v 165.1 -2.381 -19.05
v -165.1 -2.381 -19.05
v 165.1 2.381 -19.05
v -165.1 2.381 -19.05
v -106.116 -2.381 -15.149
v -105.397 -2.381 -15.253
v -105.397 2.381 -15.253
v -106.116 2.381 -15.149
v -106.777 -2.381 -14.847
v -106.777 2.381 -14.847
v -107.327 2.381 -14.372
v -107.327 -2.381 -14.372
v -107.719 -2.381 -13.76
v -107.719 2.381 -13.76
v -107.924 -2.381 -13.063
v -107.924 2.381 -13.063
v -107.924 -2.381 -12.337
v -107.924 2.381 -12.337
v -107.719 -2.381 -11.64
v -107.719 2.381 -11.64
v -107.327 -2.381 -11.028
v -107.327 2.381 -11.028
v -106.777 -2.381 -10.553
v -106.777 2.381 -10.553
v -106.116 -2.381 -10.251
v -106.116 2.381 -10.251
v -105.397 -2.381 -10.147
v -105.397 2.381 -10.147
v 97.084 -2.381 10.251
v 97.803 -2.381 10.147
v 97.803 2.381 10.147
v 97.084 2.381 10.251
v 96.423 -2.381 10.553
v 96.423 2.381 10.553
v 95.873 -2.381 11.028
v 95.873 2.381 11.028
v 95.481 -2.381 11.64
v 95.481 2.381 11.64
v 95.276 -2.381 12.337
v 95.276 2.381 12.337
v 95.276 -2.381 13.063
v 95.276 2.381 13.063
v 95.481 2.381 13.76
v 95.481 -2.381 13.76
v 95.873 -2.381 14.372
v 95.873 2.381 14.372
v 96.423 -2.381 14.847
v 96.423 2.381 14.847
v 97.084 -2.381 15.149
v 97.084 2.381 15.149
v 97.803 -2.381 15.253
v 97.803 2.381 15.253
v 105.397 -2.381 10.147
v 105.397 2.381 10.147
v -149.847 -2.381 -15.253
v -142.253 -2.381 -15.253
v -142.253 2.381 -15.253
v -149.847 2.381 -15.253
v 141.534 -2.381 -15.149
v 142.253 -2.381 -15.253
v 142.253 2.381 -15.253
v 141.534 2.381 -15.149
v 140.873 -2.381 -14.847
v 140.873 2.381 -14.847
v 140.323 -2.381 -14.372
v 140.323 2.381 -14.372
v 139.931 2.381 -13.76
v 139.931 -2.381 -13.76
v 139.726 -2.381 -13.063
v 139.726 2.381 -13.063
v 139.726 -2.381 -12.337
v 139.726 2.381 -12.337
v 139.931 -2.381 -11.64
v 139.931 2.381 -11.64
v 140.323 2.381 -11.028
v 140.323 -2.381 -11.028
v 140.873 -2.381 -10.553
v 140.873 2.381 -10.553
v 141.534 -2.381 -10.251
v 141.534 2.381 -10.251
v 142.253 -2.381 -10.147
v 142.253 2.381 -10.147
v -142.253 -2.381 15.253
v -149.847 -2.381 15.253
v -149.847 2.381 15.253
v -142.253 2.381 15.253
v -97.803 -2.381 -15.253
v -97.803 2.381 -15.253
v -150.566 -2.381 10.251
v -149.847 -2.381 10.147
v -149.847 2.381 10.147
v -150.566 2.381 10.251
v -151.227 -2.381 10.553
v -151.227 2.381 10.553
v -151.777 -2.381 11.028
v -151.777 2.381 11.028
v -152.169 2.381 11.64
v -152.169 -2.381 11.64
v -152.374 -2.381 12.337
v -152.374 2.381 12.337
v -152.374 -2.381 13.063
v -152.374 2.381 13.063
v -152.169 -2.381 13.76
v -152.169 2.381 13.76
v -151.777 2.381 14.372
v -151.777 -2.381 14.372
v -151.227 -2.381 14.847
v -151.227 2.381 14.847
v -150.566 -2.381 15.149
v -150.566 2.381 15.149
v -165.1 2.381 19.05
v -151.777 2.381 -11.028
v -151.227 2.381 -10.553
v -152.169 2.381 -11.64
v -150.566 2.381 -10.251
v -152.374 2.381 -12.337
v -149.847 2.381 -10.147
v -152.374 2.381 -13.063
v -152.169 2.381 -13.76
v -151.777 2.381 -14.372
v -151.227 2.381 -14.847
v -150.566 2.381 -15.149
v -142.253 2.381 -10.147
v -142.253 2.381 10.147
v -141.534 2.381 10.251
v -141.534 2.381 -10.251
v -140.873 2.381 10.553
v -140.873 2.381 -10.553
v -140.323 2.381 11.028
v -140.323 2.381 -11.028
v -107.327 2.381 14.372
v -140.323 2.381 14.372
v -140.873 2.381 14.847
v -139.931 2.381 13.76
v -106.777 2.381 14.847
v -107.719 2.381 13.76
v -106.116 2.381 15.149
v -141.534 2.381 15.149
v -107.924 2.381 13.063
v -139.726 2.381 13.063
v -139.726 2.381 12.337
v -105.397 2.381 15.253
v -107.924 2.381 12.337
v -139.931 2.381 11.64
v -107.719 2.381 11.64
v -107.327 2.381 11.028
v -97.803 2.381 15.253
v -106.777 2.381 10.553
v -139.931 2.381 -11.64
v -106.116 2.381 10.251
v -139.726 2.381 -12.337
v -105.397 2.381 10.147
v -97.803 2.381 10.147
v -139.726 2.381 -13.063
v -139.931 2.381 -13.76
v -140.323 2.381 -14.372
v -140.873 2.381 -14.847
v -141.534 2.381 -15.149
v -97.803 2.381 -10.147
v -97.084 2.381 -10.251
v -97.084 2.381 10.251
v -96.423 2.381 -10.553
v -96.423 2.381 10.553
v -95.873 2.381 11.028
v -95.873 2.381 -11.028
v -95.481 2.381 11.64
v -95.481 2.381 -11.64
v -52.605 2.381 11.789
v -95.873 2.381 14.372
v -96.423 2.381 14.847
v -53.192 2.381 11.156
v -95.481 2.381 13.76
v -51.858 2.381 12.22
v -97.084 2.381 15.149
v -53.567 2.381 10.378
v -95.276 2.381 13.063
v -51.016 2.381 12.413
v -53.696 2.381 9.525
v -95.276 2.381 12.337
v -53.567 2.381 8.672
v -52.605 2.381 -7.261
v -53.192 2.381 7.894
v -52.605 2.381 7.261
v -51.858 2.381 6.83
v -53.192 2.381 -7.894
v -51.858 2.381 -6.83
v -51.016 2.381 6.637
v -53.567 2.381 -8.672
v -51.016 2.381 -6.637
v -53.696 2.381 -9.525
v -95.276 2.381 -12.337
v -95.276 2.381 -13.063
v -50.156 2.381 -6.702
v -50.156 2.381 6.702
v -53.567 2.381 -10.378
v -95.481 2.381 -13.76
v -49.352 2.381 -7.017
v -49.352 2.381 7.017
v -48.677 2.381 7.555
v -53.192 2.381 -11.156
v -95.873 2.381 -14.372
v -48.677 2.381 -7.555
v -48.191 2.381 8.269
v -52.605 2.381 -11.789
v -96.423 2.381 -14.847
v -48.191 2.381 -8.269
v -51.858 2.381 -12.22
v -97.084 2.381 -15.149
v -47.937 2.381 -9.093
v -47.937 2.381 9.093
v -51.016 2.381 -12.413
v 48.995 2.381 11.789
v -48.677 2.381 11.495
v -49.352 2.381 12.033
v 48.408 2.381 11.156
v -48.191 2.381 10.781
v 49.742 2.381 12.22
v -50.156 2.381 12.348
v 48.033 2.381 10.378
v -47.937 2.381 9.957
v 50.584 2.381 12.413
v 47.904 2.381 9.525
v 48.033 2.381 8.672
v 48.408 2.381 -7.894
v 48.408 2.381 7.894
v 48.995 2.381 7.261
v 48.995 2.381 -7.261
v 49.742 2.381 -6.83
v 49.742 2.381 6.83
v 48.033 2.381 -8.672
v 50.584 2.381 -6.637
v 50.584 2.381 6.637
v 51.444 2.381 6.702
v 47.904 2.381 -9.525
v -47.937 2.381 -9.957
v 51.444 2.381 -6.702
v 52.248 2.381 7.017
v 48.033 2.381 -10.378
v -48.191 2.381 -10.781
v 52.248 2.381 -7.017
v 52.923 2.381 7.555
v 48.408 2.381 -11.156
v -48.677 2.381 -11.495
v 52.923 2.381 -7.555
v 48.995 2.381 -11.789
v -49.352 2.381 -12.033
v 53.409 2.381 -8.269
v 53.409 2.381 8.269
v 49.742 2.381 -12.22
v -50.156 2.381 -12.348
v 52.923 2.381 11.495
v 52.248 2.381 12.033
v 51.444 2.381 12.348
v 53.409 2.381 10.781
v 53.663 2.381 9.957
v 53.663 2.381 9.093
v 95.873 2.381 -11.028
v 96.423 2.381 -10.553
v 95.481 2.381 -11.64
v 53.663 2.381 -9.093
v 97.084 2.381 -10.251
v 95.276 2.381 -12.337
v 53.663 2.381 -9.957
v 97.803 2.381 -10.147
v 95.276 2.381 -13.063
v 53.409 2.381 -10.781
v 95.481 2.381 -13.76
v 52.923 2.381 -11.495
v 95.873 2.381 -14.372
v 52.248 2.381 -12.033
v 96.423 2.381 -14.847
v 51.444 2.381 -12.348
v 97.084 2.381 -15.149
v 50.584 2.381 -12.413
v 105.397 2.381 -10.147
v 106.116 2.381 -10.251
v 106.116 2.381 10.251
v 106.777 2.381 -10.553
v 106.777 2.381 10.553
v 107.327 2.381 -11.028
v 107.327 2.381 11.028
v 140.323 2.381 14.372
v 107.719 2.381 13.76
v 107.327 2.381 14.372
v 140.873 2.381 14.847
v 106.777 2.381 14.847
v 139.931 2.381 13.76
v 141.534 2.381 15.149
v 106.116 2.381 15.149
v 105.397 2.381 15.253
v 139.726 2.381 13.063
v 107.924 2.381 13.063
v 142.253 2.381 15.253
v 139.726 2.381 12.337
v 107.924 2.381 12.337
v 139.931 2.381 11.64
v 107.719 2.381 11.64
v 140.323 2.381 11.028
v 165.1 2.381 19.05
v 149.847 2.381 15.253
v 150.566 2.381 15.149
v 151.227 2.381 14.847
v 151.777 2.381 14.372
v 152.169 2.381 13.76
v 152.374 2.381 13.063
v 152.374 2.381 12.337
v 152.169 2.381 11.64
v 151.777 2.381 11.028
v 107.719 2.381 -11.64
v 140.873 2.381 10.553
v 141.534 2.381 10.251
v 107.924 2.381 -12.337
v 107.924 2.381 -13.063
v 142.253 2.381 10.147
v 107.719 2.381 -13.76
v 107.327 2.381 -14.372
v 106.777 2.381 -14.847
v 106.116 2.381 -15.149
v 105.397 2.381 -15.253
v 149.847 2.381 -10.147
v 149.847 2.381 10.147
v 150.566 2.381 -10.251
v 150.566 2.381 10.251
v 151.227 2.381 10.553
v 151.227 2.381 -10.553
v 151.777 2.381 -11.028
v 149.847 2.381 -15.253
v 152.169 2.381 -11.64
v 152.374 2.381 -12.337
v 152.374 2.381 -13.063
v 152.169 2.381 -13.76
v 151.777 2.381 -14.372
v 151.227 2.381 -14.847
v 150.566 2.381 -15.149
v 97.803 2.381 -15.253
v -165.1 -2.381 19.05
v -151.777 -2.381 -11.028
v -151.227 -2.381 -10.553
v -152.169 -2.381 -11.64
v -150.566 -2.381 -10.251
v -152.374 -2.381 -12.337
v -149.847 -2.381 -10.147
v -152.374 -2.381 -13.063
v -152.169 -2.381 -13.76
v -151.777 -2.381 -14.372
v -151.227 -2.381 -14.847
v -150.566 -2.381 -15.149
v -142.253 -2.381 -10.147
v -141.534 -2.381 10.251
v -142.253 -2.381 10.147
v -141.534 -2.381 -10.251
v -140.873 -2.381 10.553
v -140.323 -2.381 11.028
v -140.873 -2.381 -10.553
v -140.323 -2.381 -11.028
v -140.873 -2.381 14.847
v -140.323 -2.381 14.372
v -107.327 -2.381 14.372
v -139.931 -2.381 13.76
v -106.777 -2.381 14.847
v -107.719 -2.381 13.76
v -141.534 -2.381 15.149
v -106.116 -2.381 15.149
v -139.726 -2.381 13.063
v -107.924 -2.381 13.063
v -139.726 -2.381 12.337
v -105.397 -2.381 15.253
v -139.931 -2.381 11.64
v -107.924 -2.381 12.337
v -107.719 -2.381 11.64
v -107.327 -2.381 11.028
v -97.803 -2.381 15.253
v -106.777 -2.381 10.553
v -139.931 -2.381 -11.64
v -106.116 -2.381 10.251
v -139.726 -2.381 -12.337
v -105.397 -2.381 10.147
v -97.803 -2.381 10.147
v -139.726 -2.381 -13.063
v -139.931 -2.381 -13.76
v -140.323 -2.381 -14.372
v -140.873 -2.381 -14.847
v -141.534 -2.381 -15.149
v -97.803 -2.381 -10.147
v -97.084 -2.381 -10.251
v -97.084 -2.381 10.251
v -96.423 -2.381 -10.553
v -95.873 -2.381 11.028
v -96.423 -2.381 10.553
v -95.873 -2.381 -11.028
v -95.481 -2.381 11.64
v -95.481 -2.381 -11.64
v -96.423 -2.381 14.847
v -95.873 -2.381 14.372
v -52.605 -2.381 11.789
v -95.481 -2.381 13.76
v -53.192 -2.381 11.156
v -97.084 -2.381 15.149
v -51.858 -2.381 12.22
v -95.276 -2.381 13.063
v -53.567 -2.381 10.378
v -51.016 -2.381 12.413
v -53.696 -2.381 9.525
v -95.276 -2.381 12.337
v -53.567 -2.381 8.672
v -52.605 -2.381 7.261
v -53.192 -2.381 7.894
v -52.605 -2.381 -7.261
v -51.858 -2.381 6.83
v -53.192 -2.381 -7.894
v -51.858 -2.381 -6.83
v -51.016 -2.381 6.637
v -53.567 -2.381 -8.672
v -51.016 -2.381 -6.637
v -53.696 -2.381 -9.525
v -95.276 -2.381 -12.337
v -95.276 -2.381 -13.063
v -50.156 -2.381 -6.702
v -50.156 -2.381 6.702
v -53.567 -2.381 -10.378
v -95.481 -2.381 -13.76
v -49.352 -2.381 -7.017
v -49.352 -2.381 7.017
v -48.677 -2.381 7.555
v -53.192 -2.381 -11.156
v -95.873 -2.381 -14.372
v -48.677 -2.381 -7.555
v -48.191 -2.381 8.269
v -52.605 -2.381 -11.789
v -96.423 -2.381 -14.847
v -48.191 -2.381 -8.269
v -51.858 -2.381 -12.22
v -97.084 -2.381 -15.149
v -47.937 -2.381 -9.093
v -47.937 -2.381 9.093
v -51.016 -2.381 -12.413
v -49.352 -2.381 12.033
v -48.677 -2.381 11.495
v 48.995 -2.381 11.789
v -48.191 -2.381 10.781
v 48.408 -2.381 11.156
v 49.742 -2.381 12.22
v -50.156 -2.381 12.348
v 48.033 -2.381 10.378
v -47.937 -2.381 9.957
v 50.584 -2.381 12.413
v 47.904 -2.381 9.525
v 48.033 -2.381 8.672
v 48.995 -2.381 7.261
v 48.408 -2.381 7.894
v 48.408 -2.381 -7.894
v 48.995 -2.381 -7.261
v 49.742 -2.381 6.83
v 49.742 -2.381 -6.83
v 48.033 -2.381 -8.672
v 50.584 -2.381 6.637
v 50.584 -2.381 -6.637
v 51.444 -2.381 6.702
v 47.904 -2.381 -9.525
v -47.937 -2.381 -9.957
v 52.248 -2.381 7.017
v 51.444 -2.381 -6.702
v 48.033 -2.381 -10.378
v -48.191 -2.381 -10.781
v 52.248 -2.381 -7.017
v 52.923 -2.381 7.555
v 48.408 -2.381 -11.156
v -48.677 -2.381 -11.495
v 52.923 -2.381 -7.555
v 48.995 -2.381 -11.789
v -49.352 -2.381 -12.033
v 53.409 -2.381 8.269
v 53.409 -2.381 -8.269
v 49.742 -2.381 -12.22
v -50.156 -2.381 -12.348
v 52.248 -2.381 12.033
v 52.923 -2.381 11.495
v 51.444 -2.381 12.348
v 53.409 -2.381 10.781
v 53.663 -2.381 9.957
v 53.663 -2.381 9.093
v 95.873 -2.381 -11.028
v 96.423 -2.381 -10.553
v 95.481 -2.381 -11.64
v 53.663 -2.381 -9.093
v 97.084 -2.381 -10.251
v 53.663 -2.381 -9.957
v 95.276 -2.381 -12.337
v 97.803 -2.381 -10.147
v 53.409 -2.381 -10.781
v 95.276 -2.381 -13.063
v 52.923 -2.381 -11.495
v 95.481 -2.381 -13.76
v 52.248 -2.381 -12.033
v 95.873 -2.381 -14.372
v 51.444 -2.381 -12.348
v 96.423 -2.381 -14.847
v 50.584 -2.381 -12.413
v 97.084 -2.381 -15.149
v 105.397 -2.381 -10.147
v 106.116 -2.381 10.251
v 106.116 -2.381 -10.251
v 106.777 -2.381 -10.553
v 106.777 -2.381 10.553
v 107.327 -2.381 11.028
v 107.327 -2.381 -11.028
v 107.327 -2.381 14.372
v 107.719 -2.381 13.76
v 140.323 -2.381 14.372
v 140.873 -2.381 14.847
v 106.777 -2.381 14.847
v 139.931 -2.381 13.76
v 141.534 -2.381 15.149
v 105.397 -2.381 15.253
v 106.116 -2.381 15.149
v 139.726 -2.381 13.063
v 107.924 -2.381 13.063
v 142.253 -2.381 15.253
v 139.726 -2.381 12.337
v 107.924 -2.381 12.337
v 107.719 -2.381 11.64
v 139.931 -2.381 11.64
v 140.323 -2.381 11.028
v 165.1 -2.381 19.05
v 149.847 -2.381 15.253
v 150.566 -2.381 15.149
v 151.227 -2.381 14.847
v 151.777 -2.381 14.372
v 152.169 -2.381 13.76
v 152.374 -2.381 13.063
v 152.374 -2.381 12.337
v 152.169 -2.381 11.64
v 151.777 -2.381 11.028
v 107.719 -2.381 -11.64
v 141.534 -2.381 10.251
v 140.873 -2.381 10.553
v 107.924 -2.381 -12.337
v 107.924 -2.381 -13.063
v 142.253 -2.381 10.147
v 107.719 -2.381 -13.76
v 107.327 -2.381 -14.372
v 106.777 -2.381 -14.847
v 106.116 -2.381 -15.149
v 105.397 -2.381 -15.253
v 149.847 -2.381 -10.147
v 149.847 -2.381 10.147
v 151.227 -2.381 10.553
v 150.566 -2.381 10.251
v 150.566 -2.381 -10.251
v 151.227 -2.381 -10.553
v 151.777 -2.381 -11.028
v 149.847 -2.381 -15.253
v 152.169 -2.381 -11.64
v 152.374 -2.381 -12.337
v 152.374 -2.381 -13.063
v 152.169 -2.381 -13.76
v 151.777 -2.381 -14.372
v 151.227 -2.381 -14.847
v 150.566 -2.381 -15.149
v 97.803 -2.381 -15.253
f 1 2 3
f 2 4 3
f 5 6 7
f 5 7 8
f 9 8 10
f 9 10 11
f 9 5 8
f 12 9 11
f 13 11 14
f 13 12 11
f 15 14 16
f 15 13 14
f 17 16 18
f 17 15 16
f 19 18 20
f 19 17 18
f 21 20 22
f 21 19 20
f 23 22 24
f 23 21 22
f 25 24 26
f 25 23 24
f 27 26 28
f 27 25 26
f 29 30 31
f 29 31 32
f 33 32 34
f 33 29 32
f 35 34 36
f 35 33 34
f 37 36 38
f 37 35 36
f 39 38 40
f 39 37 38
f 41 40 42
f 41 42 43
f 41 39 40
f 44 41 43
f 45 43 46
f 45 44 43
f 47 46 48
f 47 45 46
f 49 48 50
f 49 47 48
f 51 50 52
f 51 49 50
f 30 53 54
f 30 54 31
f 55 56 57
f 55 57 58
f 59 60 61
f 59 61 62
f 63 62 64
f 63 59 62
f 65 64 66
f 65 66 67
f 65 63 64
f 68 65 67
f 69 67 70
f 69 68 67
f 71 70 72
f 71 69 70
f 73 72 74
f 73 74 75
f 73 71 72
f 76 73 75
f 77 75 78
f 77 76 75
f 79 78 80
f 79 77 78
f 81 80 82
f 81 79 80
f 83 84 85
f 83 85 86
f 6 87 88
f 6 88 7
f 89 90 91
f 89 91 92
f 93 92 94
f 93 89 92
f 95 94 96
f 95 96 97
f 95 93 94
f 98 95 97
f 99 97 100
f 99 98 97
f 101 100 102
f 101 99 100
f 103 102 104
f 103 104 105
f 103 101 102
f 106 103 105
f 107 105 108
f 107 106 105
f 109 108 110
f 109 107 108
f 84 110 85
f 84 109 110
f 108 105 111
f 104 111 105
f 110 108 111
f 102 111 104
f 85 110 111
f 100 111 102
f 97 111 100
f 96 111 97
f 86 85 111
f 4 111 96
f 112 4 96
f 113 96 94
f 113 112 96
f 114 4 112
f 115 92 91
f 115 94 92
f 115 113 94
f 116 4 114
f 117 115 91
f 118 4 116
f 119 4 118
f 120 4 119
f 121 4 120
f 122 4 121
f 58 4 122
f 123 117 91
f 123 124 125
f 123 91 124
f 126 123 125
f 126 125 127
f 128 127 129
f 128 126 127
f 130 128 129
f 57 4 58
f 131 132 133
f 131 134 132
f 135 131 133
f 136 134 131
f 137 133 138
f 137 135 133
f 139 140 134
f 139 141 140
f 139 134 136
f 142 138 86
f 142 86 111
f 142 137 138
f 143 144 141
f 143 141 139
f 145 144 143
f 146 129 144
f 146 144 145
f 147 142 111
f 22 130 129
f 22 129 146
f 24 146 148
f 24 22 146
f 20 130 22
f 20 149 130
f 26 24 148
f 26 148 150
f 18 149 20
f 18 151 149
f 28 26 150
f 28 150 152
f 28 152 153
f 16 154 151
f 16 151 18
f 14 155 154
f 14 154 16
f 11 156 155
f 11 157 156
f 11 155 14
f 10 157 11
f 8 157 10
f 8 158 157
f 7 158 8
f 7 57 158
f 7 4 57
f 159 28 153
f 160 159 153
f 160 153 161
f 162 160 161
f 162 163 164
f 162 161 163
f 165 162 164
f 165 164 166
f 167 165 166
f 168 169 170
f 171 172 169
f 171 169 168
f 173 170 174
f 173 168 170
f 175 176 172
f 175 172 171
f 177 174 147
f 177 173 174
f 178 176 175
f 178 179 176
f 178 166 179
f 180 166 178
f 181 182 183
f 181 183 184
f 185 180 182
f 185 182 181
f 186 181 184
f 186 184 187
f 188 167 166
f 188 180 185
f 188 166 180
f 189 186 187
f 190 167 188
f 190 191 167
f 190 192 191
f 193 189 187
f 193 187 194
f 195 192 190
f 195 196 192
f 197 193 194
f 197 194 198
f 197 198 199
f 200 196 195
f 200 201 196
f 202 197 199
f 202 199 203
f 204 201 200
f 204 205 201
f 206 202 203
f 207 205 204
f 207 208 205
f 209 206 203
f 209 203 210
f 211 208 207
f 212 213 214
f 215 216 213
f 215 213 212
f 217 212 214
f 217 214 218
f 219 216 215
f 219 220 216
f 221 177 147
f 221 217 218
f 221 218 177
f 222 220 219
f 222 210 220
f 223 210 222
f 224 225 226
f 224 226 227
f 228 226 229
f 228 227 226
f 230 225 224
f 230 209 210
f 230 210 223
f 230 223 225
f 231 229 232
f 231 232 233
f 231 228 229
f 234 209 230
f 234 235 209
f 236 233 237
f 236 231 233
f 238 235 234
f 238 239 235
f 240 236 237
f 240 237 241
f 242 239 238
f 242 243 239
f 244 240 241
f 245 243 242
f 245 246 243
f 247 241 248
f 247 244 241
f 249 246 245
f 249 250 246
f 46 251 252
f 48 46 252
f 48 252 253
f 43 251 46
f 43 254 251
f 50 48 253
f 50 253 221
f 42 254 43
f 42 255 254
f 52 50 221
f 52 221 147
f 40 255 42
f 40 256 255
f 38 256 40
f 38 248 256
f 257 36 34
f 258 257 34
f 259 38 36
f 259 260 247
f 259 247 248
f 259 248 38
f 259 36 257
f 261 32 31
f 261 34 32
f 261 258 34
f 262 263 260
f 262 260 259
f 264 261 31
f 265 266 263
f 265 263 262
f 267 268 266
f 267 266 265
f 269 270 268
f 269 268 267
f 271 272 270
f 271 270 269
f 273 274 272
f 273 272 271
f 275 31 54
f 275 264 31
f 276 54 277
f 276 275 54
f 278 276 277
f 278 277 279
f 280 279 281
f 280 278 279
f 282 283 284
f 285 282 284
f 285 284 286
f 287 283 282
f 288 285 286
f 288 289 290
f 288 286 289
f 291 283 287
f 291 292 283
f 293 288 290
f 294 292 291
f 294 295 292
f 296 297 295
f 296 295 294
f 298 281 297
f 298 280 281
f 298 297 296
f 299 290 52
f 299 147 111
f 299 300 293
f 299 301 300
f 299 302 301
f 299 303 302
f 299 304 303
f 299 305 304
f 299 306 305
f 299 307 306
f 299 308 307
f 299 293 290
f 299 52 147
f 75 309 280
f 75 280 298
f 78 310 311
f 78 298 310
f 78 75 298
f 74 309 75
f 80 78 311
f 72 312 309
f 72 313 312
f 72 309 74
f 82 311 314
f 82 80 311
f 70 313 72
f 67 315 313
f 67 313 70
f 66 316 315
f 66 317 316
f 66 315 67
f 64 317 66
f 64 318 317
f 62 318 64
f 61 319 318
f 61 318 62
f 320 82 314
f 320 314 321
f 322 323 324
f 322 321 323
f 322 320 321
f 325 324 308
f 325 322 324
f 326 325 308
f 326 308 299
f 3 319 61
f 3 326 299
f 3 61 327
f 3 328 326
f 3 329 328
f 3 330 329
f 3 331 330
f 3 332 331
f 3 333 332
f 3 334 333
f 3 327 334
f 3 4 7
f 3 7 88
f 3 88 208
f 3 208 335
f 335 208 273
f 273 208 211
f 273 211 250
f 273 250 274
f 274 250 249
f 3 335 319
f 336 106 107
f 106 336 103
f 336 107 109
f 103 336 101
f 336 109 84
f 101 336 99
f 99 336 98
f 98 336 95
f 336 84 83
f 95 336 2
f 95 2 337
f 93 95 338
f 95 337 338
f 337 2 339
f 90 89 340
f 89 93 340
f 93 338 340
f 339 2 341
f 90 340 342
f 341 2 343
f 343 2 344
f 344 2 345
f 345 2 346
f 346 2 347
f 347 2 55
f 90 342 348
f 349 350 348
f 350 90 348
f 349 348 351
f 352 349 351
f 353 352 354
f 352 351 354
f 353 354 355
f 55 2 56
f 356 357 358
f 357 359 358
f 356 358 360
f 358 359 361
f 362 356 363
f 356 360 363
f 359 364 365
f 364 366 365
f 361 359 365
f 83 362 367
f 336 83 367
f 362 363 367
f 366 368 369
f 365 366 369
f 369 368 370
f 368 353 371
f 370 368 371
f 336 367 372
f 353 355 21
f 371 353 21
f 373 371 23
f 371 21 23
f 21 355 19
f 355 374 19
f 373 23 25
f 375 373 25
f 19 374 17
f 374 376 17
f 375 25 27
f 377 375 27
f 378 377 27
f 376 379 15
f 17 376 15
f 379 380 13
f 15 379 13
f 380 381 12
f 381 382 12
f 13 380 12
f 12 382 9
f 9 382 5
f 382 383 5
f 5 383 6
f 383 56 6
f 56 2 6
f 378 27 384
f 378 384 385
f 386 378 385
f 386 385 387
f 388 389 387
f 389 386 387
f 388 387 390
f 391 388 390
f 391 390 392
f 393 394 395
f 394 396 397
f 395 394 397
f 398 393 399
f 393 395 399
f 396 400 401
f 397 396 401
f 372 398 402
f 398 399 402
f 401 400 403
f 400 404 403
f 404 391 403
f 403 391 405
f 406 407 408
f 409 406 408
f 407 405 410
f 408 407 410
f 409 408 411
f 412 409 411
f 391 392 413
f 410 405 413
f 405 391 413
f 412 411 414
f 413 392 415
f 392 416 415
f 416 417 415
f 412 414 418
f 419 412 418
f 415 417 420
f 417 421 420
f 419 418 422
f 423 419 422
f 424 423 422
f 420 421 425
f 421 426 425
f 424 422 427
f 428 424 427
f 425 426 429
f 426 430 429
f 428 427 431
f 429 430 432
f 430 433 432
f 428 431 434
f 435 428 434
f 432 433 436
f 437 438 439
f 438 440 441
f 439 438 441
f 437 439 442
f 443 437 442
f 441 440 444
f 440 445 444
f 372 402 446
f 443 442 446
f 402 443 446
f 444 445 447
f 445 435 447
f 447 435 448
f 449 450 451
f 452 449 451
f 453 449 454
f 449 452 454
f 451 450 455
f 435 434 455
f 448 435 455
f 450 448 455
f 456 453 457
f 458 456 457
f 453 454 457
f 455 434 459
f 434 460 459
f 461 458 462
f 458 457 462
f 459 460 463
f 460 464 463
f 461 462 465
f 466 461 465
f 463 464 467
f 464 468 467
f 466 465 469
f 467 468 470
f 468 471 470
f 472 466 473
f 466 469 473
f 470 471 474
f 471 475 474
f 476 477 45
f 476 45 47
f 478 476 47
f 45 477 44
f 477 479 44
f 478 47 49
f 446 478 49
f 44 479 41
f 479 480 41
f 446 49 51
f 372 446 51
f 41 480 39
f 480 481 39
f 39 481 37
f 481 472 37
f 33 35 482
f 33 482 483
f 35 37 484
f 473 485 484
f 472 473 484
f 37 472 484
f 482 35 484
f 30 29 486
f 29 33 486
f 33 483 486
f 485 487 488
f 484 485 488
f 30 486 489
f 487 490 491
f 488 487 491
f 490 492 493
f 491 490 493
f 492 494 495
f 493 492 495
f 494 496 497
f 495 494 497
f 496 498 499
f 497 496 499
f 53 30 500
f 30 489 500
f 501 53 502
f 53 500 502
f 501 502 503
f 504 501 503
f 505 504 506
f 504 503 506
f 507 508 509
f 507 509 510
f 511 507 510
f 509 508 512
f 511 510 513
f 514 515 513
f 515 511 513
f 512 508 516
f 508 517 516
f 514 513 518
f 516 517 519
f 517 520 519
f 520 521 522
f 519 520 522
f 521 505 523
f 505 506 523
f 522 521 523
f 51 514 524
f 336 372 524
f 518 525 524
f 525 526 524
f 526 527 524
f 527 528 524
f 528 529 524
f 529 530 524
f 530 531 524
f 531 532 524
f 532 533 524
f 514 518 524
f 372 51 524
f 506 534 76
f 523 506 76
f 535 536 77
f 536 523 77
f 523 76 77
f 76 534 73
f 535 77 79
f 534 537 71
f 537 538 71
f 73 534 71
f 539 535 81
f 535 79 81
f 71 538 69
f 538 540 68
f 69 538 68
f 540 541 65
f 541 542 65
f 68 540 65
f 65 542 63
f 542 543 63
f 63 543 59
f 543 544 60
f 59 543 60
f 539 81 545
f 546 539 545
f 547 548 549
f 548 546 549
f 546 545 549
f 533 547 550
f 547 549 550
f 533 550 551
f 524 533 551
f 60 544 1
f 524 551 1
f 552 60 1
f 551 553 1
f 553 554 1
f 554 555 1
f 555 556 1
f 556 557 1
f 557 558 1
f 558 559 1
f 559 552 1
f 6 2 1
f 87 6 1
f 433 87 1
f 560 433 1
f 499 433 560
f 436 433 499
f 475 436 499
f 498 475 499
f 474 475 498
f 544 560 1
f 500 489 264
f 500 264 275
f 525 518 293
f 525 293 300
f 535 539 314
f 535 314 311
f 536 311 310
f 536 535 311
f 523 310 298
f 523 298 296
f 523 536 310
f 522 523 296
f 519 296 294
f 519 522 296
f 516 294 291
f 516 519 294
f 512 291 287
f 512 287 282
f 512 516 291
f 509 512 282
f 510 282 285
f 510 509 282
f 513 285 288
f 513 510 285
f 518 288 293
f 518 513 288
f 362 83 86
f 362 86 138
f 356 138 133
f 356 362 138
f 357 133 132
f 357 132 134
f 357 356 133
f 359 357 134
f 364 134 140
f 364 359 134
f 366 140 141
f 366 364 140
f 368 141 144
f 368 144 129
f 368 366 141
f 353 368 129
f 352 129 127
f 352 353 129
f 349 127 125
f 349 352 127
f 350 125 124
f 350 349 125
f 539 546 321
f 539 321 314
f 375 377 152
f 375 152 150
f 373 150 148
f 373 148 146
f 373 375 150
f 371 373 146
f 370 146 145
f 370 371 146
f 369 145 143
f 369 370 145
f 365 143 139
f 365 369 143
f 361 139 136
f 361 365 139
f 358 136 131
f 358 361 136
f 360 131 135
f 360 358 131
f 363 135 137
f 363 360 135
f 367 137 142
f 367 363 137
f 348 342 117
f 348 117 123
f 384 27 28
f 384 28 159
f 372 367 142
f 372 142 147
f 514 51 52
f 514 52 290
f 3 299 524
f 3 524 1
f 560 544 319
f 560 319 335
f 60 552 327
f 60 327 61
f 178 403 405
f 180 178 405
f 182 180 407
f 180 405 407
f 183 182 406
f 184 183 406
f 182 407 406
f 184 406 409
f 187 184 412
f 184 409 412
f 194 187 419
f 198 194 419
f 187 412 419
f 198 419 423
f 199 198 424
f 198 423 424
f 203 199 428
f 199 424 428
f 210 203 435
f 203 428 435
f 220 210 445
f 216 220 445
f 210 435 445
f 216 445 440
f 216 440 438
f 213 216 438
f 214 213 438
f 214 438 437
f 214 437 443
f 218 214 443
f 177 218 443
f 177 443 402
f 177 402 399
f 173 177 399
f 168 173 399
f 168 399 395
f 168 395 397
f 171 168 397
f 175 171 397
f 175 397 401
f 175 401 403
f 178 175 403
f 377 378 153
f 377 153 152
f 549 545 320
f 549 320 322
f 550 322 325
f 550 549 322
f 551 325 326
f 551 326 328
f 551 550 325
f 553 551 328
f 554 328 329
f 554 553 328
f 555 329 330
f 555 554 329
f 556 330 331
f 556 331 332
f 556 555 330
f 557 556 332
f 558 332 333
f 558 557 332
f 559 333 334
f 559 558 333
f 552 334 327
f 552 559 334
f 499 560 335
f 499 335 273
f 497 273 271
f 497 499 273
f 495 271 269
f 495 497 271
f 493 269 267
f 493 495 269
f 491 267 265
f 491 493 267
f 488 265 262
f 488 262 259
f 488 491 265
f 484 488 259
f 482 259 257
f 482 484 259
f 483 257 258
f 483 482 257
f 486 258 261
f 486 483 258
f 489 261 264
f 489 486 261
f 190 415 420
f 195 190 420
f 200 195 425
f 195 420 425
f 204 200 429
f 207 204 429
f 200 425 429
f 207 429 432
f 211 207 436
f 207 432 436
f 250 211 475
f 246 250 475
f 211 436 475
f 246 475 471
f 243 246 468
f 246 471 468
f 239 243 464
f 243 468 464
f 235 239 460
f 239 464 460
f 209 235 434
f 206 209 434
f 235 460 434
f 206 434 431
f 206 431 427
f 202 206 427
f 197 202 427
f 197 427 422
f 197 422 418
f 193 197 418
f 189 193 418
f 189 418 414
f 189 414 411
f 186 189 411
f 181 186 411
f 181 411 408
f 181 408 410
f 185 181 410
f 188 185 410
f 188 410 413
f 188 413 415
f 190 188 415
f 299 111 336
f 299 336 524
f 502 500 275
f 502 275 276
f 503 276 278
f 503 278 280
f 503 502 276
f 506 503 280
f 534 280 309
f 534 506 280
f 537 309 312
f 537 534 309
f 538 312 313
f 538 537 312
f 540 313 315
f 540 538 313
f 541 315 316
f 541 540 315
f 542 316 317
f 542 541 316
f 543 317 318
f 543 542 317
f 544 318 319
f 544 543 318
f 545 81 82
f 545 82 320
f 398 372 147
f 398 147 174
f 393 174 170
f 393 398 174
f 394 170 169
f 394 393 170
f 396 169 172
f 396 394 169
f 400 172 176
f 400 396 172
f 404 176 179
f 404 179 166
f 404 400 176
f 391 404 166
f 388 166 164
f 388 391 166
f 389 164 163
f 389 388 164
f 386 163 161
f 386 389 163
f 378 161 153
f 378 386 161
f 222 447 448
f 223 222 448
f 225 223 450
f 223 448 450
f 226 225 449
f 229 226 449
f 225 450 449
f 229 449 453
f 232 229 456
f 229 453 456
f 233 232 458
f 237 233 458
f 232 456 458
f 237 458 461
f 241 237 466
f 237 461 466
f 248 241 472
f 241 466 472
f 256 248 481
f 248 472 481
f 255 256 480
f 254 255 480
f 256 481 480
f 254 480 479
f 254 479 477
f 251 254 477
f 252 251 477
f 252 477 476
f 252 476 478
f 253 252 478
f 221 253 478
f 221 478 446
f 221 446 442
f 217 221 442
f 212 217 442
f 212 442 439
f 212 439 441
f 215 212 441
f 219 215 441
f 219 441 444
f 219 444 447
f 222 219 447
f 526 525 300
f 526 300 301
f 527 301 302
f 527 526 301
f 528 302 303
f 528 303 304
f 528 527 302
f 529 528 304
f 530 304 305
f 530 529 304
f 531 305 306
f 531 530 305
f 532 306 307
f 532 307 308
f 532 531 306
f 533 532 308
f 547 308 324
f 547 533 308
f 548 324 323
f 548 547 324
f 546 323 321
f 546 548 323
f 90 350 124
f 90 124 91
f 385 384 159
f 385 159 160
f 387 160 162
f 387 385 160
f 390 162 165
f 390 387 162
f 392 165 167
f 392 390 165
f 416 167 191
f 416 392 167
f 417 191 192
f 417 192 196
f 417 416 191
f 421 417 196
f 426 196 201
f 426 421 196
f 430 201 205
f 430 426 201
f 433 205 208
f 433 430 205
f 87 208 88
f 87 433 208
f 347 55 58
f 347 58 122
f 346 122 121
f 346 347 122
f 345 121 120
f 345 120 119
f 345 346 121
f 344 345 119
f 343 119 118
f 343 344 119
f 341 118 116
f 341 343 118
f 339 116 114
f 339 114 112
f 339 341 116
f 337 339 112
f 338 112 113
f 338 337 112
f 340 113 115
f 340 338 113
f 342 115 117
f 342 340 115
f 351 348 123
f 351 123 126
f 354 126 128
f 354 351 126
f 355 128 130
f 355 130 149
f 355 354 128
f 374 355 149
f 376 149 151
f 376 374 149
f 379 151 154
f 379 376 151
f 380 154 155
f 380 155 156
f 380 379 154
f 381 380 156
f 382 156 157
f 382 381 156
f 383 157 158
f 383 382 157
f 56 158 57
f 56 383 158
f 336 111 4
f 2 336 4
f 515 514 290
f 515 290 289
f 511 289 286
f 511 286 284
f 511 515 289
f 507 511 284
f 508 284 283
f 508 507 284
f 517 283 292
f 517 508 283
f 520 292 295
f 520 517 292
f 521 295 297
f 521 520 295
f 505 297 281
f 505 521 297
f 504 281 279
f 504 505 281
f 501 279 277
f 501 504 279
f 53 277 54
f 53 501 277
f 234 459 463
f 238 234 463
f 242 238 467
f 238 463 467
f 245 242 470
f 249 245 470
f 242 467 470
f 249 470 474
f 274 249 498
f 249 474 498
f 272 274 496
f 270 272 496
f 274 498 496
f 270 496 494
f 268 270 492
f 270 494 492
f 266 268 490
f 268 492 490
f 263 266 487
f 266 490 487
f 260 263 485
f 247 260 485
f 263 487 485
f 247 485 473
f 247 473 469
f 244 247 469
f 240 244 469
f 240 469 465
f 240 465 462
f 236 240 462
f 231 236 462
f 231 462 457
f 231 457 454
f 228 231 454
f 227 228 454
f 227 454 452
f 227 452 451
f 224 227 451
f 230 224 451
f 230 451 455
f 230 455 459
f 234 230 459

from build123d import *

# Parameters (mm, degrees)
SKETCH1_W                  = 330.2
SKETCH1_H                  = 38.1
BOSS_EXTRUDE1_DEPTH        = 2.38125
F_10_START                 = -2.38125
F_10_CLEARANCE_SLOT1_DEPTH = 4.7625
F_1_4_20_TAPPED_HOLE1_D    = 5.7912


# Read off the part's stored shape, not the designer's step: #10 Clearance Slot1
with BuildPart() as part:
    # Sketch1 → Boss-Extrude1 (new, symmetric)
    with BuildSketch(Plane(origin=(0, 0, 0), x_dir=(1, 0, 0), z_dir=(0, 1, 0))):
        Rectangle(SKETCH1_W, SKETCH1_H)
    extrude(amount=BOSS_EXTRUDE1_DEPTH, both=True)

    # #10 Clearance Slot1 outline → #10 Clearance Slot1 (cut)
    with BuildSketch(Plane(origin=(0, 0, 0), x_dir=(1, 0, 0), z_dir=(0, 1, 0)).offset(F_10_START)):
        with BuildLine():
            Line((142.2527, 10.1473), (149.8473, 10.1473))
            ThreePointArc((149.8473, 10.1473), (152.4, 12.7), (149.8473, 15.2527))
            Line((149.8473, 15.2527), (142.2527, 15.2527))
            ThreePointArc((142.2527, 15.2527), (139.7, 12.7), (142.2527, 10.1473))
        make_face()
        with BuildLine():
            ThreePointArc((105.3973, 10.1473), (107.95, 12.7), (105.3973, 15.2527))
            Line((105.3973, 15.2527), (97.8027, 15.2527))
            ThreePointArc((97.8027, 15.2527), (95.25, 12.7), (97.8027, 10.1473))
            Line((97.8027, 10.1473), (105.3973, 10.1473))
        make_face()
        with BuildLine():
            ThreePointArc((-142.2527, 10.1473), (-139.7, 12.7), (-142.2527, 15.2527))
            Line((-142.2527, 15.2527), (-149.8473, 15.2527))
            ThreePointArc((-149.8473, 15.2527), (-152.4, 12.7), (-149.8473, 10.1473))
            Line((-149.8473, 10.1473), (-142.2527, 10.1473))
        make_face()
        with BuildLine():
            ThreePointArc((-97.8027, 10.1473), (-95.25, 12.7), (-97.8027, 15.2527))
            Line((-97.8027, 15.2527), (-105.3973, 15.2527))
            ThreePointArc((-105.3973, 15.2527), (-107.95, 12.7), (-105.3973, 10.1473))
            Line((-105.3973, 10.1473), (-97.8027, 10.1473))
        make_face()
        with BuildLine():
            Line((142.2527, -15.2527), (149.8473, -15.2527))
            ThreePointArc((149.8473, -15.2527), (152.4, -12.7), (149.8473, -10.1473))
            Line((149.8473, -10.1473), (142.2527, -10.1473))
            ThreePointArc((142.2527, -10.1473), (139.7, -12.7), (142.2527, -15.2527))
        make_face()
        with BuildLine():
            ThreePointArc((105.3973, -15.2527), (107.95, -12.7), (105.3973, -10.1473))
            Line((105.3973, -10.1473), (97.8027, -10.1473))
            ThreePointArc((97.8027, -10.1473), (95.25, -12.7), (97.8027, -15.2527))
            Line((97.8027, -15.2527), (105.3973, -15.2527))
        make_face()
        with BuildLine():
            ThreePointArc((-97.8027, -15.2527), (-95.25, -12.7), (-97.8027, -10.1473))
            Line((-97.8027, -10.1473), (-105.3973, -10.1473))
            ThreePointArc((-105.3973, -10.1473), (-107.95, -12.7), (-105.3973, -15.2527))
            Line((-105.3973, -15.2527), (-97.8027, -15.2527))
        make_face()
        with BuildLine():
            ThreePointArc((-142.2527, -15.2527), (-139.7, -12.7), (-142.2527, -10.1473))
            Line((-142.2527, -10.1473), (-149.8473, -10.1473))
            ThreePointArc((-149.8473, -10.1473), (-152.4, -12.7), (-149.8473, -15.2527))
            Line((-149.8473, -15.2527), (-142.2527, -15.2527))
        make_face()
    extrude(amount=F_10_CLEARANCE_SLOT1_DEPTH, mode=Mode.SUBTRACT)

    # 1/4-20 Tapped Hole1 (through all)
    with Locations(Plane(origin=(0, 2.38125, 0), x_dir=(1, 0, 0), z_dir=(0, 1, 0))):
        with Locations((-50.8, 9.525), (-50.8, -9.525), (50.8, -9.525), (50.8, 9.525)):
            Hole(F_1_4_20_TAPPED_HOLE1_D / 2)


solid = part.part
